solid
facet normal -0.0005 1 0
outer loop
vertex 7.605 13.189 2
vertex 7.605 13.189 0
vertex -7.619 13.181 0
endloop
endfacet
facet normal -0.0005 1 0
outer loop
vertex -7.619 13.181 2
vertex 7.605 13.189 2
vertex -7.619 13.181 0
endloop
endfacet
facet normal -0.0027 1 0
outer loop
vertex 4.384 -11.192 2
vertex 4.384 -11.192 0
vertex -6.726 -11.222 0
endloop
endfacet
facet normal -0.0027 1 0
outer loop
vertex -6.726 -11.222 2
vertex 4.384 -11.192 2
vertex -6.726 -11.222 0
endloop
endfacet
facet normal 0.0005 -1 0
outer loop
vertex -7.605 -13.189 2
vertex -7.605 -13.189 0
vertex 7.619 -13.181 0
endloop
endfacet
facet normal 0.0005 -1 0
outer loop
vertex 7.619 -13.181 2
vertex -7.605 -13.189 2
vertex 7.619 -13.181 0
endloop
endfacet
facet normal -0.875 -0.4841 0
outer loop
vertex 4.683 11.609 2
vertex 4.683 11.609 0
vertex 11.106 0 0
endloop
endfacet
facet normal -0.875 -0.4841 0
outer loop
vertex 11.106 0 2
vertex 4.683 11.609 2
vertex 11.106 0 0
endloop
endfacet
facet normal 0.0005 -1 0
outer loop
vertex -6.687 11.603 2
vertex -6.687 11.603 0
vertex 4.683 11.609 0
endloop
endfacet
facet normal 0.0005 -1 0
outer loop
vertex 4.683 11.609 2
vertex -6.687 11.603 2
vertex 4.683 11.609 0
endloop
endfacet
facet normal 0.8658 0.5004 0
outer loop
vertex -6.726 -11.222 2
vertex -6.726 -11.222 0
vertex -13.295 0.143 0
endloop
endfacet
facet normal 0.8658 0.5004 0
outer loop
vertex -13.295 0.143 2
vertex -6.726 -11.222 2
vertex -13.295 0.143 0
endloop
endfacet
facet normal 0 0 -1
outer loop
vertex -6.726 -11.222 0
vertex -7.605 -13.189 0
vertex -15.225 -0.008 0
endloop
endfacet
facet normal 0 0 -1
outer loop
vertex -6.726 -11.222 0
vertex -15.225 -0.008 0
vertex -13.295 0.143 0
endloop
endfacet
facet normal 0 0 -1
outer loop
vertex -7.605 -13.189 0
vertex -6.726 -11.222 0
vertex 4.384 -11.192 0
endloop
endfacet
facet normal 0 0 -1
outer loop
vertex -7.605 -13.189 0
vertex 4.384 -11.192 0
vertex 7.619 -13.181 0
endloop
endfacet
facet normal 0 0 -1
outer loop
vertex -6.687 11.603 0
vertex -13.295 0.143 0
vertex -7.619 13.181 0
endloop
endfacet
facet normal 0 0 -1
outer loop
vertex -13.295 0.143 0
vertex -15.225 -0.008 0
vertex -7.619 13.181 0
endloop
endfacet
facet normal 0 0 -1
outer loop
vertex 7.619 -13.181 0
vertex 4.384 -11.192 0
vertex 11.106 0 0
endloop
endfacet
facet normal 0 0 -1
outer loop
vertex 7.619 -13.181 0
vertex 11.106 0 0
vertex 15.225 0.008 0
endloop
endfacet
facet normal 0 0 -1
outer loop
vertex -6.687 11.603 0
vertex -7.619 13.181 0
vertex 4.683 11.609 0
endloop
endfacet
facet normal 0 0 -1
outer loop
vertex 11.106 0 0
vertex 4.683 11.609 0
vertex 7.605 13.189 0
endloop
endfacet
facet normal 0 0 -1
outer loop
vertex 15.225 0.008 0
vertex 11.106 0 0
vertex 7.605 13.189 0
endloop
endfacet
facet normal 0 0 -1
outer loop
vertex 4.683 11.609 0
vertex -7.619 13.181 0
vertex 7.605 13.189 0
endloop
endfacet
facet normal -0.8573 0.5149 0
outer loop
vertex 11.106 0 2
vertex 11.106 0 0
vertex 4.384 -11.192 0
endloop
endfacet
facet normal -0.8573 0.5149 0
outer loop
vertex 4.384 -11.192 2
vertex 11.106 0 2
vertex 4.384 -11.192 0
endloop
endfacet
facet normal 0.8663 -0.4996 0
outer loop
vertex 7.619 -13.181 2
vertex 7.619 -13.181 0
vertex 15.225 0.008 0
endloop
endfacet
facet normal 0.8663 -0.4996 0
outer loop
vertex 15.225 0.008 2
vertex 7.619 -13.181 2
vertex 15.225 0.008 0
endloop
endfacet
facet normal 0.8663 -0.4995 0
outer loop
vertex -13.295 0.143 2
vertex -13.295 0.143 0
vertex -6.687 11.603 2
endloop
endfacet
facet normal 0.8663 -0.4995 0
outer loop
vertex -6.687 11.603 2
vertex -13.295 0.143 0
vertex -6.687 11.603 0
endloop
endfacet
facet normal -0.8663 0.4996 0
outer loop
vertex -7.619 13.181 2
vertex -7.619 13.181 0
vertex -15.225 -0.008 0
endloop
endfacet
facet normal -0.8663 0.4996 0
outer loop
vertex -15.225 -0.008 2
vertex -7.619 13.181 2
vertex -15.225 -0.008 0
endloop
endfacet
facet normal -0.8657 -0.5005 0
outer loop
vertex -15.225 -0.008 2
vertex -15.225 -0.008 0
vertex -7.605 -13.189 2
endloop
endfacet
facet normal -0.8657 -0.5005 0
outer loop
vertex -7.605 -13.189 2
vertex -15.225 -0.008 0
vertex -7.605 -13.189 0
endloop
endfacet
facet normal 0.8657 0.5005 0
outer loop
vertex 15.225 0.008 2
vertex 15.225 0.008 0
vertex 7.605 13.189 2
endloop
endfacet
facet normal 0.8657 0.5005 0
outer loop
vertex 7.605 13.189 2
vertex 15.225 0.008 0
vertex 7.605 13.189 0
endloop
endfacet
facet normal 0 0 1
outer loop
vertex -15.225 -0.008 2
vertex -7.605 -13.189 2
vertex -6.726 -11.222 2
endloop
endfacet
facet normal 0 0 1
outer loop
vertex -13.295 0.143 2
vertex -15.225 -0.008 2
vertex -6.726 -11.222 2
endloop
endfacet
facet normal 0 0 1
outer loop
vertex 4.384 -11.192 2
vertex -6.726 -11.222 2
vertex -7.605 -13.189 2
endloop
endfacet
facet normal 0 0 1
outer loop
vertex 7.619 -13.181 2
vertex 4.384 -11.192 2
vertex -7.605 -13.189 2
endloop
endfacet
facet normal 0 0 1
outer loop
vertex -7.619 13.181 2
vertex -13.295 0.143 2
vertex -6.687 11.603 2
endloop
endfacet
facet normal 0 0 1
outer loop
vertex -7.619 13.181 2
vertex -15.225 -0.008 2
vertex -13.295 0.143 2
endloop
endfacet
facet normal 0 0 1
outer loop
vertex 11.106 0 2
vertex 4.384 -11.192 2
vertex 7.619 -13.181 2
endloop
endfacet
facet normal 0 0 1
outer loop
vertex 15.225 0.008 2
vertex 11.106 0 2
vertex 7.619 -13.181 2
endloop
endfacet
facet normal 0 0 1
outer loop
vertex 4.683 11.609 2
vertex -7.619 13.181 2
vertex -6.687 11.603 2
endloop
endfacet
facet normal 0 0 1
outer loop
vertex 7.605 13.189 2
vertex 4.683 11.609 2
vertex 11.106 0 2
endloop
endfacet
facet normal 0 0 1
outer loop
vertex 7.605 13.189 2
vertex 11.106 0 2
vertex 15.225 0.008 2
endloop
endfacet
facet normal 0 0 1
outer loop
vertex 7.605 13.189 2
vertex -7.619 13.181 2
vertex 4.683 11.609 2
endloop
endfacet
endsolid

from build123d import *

# Parameters (mm, degrees)
F1_DEPTH = 2


with BuildPart() as f1:
    # F0 (on Top) → F1 (new body)
    with BuildSketch(Plane.XY):
        Polygon((-15.224708, -0.007928), (-7.605488, -13.188947), (7.61922, -13.18102), (15.224708, 0.007928), (7.605488, 13.188947), (-7.61922, 13.18102), align=None)
        Polygon((4.384312, -11.191897), (-6.725698, -11.222334), (-13.29542, 0.143087), (-6.687111, 11.60279), (4.683197, 11.608711), (11.105834, 0), align=None, mode=Mode.SUBTRACT)
    extrude(amount=F1_DEPTH)


solid = f1.part
